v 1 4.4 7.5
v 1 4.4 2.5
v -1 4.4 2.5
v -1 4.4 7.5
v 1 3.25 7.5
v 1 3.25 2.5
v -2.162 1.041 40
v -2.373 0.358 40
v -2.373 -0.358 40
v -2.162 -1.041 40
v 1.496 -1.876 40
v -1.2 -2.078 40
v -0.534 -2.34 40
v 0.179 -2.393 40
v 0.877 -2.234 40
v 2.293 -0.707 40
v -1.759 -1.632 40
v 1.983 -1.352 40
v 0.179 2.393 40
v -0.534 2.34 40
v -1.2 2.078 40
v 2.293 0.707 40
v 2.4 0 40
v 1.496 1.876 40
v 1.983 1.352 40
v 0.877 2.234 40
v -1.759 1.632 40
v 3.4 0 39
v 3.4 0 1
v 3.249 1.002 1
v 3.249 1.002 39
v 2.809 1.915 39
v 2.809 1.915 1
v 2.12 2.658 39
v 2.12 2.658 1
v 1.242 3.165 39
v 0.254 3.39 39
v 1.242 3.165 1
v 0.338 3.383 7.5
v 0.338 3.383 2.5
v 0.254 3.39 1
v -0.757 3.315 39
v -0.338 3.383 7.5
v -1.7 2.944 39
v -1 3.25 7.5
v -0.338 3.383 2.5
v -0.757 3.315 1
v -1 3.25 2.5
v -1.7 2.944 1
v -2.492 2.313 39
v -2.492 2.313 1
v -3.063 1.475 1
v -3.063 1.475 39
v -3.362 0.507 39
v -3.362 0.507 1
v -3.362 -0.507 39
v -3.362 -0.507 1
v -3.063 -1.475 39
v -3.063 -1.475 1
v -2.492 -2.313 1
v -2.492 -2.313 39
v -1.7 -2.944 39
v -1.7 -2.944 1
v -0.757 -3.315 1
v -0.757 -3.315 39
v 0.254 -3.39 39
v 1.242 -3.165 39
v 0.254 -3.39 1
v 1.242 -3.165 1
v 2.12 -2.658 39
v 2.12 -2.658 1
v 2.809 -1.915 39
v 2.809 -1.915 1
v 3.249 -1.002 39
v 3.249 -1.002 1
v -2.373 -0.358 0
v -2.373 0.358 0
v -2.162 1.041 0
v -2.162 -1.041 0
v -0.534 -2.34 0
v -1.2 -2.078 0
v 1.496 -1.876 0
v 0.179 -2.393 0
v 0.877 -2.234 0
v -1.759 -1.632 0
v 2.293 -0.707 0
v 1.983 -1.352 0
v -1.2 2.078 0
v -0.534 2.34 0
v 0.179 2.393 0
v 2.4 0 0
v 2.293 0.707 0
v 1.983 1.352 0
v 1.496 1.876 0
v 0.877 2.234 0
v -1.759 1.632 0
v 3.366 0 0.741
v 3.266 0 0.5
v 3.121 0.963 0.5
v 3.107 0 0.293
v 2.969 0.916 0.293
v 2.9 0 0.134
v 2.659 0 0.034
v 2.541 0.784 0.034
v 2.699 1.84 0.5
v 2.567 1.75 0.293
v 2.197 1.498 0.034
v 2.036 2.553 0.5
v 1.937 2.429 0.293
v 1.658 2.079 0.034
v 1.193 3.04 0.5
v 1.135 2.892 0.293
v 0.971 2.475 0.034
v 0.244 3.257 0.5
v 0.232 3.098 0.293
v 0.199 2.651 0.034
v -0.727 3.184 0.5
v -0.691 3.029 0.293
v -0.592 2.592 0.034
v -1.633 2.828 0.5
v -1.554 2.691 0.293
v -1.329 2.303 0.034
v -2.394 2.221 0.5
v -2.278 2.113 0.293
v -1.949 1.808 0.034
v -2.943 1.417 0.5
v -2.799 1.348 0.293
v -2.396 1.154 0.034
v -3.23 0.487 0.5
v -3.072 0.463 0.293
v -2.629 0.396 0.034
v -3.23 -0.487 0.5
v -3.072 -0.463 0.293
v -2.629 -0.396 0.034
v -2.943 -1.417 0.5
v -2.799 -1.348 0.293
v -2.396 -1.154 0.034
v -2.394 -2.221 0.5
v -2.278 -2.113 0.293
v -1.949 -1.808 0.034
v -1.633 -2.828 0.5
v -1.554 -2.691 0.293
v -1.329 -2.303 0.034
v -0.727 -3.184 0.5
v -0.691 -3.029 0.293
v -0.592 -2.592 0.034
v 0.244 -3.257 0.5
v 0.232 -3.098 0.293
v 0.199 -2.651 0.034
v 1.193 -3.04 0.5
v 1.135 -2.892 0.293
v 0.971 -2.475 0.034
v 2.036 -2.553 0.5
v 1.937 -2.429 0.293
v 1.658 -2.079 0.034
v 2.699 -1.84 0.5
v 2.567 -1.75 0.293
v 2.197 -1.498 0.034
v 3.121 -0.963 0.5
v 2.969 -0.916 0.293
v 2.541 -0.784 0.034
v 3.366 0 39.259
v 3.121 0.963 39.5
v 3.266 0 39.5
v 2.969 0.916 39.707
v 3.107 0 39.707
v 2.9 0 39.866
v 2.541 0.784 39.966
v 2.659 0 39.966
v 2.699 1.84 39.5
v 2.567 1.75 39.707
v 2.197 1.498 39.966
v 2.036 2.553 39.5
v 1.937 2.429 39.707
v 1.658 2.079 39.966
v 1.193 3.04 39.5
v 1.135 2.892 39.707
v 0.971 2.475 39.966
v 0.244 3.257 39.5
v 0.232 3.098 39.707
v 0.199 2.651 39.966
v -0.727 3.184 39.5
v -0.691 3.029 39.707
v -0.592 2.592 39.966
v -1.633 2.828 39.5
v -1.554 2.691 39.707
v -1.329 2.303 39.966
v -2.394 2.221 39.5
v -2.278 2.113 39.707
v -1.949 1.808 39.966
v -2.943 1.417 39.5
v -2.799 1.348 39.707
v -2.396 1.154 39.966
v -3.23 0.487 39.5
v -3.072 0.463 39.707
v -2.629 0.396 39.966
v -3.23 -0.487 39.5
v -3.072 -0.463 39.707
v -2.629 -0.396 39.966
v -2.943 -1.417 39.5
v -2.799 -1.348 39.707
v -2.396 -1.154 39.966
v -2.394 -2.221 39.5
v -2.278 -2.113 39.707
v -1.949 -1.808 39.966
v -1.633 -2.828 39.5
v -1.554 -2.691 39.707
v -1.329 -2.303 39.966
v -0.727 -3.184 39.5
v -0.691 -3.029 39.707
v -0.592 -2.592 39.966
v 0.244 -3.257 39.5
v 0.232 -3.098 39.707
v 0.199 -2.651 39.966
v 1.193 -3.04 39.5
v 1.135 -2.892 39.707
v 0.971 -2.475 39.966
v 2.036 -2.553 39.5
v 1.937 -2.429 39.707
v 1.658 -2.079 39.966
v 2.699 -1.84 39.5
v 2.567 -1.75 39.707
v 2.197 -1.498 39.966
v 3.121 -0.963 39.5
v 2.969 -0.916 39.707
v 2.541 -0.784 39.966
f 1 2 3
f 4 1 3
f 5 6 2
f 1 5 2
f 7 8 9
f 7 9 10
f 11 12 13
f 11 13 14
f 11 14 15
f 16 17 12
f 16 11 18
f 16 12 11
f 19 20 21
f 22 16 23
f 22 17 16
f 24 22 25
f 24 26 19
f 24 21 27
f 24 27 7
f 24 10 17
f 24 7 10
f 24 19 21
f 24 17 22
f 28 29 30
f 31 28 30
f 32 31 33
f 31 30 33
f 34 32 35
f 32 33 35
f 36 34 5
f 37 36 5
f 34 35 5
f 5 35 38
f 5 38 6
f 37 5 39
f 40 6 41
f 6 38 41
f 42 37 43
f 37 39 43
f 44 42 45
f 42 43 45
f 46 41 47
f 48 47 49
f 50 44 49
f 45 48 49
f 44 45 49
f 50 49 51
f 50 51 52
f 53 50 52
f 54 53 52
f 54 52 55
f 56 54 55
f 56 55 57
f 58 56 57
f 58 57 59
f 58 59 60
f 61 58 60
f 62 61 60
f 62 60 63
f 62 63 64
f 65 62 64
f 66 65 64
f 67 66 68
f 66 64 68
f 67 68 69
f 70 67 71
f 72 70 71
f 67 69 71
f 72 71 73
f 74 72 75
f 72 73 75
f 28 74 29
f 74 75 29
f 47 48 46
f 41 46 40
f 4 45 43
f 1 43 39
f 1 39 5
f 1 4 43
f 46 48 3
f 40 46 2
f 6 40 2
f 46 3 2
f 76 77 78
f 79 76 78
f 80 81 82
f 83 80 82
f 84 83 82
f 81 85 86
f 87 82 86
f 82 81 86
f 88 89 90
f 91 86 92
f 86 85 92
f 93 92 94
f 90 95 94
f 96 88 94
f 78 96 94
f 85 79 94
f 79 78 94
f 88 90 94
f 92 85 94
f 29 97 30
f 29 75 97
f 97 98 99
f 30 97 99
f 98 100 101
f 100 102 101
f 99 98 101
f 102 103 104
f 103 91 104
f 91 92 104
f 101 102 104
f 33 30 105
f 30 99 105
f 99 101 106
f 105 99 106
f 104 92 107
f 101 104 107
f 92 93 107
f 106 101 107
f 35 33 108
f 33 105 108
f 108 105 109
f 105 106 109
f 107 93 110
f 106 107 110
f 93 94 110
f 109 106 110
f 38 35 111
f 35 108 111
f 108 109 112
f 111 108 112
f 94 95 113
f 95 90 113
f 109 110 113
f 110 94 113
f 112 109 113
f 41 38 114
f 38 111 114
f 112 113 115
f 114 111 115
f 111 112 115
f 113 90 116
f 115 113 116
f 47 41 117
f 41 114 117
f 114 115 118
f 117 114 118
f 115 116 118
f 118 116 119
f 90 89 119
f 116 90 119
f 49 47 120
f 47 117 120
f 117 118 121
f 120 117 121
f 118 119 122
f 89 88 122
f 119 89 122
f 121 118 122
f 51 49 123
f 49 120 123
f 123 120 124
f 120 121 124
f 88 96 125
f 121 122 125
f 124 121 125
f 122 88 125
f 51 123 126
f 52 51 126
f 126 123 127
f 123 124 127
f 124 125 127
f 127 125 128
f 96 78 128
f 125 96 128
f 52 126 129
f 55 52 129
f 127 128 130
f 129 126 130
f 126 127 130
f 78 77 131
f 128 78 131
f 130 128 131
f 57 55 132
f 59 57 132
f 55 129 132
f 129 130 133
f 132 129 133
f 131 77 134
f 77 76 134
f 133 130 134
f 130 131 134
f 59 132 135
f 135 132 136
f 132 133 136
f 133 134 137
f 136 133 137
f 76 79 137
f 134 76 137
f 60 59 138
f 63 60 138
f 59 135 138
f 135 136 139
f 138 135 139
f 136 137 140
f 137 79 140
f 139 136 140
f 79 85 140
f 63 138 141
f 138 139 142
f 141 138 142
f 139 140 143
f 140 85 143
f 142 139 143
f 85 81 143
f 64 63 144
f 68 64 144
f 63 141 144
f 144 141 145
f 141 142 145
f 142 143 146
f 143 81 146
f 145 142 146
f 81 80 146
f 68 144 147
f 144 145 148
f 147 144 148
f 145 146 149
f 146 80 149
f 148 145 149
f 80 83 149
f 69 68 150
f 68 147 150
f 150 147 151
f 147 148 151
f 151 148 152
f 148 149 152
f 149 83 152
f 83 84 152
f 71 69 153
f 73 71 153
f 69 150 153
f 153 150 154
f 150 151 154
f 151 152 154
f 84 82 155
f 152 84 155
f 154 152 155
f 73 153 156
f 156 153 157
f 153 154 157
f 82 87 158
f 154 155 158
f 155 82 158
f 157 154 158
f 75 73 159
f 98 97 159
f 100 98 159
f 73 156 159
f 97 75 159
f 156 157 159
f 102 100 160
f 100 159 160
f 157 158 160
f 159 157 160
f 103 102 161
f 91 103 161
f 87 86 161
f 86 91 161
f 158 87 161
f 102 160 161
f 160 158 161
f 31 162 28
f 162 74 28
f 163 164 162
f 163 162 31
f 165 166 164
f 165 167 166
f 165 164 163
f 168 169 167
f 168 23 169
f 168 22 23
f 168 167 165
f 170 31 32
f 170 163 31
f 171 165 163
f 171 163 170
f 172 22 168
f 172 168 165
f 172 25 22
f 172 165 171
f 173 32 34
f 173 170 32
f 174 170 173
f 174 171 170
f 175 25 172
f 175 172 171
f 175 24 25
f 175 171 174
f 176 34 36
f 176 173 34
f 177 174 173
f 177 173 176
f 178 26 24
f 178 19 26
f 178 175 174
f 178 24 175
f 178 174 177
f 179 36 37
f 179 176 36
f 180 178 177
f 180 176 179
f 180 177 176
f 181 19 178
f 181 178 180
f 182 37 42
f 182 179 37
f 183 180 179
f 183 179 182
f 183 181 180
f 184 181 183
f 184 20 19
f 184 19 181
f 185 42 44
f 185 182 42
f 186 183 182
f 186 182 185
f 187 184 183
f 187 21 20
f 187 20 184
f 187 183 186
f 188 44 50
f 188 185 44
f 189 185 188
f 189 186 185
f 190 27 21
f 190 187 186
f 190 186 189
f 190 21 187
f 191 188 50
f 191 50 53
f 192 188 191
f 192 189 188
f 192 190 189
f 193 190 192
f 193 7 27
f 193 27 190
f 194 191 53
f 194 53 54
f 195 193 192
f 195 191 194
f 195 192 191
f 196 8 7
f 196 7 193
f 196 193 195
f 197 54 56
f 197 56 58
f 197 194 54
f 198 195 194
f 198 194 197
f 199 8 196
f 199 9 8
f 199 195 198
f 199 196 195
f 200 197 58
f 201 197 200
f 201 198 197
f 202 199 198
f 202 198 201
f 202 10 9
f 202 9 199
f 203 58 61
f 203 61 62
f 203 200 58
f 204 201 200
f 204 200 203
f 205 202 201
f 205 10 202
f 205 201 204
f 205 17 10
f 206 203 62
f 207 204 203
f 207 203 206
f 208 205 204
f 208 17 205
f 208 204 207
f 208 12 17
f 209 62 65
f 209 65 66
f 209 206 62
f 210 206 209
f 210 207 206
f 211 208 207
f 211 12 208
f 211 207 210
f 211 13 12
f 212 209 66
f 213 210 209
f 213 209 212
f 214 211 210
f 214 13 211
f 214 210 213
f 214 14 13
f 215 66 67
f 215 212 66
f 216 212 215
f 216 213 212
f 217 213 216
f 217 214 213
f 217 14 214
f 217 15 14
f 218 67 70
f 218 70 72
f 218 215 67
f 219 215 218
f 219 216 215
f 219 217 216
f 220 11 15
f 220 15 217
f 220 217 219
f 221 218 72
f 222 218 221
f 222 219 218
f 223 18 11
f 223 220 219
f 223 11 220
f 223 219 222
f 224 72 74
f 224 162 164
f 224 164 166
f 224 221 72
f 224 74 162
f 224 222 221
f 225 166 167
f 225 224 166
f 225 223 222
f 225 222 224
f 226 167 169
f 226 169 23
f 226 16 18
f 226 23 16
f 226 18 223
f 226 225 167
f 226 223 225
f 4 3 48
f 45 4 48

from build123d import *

# Parameters (mm, degrees)
SKETCH1_R           = 3.4
BOSS_EXTRUDE1_DEPTH = 40
FILLET2_R           = 1
BOSS_EXTRUDE2_DEPTH = 5


with BuildPart() as part:
    # Sketch1 → Boss-Extrude1 (new body)
    with BuildSketch(Plane.XY):
        Circle(SKETCH1_R)
    extrude(amount=BOSS_EXTRUDE1_DEPTH)

    # Fillet2
    fillet2_edges = [part.edges().sort_by_distance(p)[0] for p in [
        (-3.4, 0, 0),
        (-3.4, 0, 40),
    ]]
    fillet(fillet2_edges, radius=FILLET2_R)

    # Sketch2 → Boss-Extrude2 (add)
    with BuildSketch(Plane.XY.offset(2.5)):
        with BuildLine():
            Line((1, 3.249615362), (1, 4.399615362))
            Line((1, 4.399615362), (-1, 4.399615362))
            Line((-1, 4.399615362), (-1, 3.249615362))
            ThreePointArc((-1, 3.249615362), (0, 3.4), (1, 3.249615362))
        make_face()
    extrude(amount=BOSS_EXTRUDE2_DEPTH)


solid = part.part
